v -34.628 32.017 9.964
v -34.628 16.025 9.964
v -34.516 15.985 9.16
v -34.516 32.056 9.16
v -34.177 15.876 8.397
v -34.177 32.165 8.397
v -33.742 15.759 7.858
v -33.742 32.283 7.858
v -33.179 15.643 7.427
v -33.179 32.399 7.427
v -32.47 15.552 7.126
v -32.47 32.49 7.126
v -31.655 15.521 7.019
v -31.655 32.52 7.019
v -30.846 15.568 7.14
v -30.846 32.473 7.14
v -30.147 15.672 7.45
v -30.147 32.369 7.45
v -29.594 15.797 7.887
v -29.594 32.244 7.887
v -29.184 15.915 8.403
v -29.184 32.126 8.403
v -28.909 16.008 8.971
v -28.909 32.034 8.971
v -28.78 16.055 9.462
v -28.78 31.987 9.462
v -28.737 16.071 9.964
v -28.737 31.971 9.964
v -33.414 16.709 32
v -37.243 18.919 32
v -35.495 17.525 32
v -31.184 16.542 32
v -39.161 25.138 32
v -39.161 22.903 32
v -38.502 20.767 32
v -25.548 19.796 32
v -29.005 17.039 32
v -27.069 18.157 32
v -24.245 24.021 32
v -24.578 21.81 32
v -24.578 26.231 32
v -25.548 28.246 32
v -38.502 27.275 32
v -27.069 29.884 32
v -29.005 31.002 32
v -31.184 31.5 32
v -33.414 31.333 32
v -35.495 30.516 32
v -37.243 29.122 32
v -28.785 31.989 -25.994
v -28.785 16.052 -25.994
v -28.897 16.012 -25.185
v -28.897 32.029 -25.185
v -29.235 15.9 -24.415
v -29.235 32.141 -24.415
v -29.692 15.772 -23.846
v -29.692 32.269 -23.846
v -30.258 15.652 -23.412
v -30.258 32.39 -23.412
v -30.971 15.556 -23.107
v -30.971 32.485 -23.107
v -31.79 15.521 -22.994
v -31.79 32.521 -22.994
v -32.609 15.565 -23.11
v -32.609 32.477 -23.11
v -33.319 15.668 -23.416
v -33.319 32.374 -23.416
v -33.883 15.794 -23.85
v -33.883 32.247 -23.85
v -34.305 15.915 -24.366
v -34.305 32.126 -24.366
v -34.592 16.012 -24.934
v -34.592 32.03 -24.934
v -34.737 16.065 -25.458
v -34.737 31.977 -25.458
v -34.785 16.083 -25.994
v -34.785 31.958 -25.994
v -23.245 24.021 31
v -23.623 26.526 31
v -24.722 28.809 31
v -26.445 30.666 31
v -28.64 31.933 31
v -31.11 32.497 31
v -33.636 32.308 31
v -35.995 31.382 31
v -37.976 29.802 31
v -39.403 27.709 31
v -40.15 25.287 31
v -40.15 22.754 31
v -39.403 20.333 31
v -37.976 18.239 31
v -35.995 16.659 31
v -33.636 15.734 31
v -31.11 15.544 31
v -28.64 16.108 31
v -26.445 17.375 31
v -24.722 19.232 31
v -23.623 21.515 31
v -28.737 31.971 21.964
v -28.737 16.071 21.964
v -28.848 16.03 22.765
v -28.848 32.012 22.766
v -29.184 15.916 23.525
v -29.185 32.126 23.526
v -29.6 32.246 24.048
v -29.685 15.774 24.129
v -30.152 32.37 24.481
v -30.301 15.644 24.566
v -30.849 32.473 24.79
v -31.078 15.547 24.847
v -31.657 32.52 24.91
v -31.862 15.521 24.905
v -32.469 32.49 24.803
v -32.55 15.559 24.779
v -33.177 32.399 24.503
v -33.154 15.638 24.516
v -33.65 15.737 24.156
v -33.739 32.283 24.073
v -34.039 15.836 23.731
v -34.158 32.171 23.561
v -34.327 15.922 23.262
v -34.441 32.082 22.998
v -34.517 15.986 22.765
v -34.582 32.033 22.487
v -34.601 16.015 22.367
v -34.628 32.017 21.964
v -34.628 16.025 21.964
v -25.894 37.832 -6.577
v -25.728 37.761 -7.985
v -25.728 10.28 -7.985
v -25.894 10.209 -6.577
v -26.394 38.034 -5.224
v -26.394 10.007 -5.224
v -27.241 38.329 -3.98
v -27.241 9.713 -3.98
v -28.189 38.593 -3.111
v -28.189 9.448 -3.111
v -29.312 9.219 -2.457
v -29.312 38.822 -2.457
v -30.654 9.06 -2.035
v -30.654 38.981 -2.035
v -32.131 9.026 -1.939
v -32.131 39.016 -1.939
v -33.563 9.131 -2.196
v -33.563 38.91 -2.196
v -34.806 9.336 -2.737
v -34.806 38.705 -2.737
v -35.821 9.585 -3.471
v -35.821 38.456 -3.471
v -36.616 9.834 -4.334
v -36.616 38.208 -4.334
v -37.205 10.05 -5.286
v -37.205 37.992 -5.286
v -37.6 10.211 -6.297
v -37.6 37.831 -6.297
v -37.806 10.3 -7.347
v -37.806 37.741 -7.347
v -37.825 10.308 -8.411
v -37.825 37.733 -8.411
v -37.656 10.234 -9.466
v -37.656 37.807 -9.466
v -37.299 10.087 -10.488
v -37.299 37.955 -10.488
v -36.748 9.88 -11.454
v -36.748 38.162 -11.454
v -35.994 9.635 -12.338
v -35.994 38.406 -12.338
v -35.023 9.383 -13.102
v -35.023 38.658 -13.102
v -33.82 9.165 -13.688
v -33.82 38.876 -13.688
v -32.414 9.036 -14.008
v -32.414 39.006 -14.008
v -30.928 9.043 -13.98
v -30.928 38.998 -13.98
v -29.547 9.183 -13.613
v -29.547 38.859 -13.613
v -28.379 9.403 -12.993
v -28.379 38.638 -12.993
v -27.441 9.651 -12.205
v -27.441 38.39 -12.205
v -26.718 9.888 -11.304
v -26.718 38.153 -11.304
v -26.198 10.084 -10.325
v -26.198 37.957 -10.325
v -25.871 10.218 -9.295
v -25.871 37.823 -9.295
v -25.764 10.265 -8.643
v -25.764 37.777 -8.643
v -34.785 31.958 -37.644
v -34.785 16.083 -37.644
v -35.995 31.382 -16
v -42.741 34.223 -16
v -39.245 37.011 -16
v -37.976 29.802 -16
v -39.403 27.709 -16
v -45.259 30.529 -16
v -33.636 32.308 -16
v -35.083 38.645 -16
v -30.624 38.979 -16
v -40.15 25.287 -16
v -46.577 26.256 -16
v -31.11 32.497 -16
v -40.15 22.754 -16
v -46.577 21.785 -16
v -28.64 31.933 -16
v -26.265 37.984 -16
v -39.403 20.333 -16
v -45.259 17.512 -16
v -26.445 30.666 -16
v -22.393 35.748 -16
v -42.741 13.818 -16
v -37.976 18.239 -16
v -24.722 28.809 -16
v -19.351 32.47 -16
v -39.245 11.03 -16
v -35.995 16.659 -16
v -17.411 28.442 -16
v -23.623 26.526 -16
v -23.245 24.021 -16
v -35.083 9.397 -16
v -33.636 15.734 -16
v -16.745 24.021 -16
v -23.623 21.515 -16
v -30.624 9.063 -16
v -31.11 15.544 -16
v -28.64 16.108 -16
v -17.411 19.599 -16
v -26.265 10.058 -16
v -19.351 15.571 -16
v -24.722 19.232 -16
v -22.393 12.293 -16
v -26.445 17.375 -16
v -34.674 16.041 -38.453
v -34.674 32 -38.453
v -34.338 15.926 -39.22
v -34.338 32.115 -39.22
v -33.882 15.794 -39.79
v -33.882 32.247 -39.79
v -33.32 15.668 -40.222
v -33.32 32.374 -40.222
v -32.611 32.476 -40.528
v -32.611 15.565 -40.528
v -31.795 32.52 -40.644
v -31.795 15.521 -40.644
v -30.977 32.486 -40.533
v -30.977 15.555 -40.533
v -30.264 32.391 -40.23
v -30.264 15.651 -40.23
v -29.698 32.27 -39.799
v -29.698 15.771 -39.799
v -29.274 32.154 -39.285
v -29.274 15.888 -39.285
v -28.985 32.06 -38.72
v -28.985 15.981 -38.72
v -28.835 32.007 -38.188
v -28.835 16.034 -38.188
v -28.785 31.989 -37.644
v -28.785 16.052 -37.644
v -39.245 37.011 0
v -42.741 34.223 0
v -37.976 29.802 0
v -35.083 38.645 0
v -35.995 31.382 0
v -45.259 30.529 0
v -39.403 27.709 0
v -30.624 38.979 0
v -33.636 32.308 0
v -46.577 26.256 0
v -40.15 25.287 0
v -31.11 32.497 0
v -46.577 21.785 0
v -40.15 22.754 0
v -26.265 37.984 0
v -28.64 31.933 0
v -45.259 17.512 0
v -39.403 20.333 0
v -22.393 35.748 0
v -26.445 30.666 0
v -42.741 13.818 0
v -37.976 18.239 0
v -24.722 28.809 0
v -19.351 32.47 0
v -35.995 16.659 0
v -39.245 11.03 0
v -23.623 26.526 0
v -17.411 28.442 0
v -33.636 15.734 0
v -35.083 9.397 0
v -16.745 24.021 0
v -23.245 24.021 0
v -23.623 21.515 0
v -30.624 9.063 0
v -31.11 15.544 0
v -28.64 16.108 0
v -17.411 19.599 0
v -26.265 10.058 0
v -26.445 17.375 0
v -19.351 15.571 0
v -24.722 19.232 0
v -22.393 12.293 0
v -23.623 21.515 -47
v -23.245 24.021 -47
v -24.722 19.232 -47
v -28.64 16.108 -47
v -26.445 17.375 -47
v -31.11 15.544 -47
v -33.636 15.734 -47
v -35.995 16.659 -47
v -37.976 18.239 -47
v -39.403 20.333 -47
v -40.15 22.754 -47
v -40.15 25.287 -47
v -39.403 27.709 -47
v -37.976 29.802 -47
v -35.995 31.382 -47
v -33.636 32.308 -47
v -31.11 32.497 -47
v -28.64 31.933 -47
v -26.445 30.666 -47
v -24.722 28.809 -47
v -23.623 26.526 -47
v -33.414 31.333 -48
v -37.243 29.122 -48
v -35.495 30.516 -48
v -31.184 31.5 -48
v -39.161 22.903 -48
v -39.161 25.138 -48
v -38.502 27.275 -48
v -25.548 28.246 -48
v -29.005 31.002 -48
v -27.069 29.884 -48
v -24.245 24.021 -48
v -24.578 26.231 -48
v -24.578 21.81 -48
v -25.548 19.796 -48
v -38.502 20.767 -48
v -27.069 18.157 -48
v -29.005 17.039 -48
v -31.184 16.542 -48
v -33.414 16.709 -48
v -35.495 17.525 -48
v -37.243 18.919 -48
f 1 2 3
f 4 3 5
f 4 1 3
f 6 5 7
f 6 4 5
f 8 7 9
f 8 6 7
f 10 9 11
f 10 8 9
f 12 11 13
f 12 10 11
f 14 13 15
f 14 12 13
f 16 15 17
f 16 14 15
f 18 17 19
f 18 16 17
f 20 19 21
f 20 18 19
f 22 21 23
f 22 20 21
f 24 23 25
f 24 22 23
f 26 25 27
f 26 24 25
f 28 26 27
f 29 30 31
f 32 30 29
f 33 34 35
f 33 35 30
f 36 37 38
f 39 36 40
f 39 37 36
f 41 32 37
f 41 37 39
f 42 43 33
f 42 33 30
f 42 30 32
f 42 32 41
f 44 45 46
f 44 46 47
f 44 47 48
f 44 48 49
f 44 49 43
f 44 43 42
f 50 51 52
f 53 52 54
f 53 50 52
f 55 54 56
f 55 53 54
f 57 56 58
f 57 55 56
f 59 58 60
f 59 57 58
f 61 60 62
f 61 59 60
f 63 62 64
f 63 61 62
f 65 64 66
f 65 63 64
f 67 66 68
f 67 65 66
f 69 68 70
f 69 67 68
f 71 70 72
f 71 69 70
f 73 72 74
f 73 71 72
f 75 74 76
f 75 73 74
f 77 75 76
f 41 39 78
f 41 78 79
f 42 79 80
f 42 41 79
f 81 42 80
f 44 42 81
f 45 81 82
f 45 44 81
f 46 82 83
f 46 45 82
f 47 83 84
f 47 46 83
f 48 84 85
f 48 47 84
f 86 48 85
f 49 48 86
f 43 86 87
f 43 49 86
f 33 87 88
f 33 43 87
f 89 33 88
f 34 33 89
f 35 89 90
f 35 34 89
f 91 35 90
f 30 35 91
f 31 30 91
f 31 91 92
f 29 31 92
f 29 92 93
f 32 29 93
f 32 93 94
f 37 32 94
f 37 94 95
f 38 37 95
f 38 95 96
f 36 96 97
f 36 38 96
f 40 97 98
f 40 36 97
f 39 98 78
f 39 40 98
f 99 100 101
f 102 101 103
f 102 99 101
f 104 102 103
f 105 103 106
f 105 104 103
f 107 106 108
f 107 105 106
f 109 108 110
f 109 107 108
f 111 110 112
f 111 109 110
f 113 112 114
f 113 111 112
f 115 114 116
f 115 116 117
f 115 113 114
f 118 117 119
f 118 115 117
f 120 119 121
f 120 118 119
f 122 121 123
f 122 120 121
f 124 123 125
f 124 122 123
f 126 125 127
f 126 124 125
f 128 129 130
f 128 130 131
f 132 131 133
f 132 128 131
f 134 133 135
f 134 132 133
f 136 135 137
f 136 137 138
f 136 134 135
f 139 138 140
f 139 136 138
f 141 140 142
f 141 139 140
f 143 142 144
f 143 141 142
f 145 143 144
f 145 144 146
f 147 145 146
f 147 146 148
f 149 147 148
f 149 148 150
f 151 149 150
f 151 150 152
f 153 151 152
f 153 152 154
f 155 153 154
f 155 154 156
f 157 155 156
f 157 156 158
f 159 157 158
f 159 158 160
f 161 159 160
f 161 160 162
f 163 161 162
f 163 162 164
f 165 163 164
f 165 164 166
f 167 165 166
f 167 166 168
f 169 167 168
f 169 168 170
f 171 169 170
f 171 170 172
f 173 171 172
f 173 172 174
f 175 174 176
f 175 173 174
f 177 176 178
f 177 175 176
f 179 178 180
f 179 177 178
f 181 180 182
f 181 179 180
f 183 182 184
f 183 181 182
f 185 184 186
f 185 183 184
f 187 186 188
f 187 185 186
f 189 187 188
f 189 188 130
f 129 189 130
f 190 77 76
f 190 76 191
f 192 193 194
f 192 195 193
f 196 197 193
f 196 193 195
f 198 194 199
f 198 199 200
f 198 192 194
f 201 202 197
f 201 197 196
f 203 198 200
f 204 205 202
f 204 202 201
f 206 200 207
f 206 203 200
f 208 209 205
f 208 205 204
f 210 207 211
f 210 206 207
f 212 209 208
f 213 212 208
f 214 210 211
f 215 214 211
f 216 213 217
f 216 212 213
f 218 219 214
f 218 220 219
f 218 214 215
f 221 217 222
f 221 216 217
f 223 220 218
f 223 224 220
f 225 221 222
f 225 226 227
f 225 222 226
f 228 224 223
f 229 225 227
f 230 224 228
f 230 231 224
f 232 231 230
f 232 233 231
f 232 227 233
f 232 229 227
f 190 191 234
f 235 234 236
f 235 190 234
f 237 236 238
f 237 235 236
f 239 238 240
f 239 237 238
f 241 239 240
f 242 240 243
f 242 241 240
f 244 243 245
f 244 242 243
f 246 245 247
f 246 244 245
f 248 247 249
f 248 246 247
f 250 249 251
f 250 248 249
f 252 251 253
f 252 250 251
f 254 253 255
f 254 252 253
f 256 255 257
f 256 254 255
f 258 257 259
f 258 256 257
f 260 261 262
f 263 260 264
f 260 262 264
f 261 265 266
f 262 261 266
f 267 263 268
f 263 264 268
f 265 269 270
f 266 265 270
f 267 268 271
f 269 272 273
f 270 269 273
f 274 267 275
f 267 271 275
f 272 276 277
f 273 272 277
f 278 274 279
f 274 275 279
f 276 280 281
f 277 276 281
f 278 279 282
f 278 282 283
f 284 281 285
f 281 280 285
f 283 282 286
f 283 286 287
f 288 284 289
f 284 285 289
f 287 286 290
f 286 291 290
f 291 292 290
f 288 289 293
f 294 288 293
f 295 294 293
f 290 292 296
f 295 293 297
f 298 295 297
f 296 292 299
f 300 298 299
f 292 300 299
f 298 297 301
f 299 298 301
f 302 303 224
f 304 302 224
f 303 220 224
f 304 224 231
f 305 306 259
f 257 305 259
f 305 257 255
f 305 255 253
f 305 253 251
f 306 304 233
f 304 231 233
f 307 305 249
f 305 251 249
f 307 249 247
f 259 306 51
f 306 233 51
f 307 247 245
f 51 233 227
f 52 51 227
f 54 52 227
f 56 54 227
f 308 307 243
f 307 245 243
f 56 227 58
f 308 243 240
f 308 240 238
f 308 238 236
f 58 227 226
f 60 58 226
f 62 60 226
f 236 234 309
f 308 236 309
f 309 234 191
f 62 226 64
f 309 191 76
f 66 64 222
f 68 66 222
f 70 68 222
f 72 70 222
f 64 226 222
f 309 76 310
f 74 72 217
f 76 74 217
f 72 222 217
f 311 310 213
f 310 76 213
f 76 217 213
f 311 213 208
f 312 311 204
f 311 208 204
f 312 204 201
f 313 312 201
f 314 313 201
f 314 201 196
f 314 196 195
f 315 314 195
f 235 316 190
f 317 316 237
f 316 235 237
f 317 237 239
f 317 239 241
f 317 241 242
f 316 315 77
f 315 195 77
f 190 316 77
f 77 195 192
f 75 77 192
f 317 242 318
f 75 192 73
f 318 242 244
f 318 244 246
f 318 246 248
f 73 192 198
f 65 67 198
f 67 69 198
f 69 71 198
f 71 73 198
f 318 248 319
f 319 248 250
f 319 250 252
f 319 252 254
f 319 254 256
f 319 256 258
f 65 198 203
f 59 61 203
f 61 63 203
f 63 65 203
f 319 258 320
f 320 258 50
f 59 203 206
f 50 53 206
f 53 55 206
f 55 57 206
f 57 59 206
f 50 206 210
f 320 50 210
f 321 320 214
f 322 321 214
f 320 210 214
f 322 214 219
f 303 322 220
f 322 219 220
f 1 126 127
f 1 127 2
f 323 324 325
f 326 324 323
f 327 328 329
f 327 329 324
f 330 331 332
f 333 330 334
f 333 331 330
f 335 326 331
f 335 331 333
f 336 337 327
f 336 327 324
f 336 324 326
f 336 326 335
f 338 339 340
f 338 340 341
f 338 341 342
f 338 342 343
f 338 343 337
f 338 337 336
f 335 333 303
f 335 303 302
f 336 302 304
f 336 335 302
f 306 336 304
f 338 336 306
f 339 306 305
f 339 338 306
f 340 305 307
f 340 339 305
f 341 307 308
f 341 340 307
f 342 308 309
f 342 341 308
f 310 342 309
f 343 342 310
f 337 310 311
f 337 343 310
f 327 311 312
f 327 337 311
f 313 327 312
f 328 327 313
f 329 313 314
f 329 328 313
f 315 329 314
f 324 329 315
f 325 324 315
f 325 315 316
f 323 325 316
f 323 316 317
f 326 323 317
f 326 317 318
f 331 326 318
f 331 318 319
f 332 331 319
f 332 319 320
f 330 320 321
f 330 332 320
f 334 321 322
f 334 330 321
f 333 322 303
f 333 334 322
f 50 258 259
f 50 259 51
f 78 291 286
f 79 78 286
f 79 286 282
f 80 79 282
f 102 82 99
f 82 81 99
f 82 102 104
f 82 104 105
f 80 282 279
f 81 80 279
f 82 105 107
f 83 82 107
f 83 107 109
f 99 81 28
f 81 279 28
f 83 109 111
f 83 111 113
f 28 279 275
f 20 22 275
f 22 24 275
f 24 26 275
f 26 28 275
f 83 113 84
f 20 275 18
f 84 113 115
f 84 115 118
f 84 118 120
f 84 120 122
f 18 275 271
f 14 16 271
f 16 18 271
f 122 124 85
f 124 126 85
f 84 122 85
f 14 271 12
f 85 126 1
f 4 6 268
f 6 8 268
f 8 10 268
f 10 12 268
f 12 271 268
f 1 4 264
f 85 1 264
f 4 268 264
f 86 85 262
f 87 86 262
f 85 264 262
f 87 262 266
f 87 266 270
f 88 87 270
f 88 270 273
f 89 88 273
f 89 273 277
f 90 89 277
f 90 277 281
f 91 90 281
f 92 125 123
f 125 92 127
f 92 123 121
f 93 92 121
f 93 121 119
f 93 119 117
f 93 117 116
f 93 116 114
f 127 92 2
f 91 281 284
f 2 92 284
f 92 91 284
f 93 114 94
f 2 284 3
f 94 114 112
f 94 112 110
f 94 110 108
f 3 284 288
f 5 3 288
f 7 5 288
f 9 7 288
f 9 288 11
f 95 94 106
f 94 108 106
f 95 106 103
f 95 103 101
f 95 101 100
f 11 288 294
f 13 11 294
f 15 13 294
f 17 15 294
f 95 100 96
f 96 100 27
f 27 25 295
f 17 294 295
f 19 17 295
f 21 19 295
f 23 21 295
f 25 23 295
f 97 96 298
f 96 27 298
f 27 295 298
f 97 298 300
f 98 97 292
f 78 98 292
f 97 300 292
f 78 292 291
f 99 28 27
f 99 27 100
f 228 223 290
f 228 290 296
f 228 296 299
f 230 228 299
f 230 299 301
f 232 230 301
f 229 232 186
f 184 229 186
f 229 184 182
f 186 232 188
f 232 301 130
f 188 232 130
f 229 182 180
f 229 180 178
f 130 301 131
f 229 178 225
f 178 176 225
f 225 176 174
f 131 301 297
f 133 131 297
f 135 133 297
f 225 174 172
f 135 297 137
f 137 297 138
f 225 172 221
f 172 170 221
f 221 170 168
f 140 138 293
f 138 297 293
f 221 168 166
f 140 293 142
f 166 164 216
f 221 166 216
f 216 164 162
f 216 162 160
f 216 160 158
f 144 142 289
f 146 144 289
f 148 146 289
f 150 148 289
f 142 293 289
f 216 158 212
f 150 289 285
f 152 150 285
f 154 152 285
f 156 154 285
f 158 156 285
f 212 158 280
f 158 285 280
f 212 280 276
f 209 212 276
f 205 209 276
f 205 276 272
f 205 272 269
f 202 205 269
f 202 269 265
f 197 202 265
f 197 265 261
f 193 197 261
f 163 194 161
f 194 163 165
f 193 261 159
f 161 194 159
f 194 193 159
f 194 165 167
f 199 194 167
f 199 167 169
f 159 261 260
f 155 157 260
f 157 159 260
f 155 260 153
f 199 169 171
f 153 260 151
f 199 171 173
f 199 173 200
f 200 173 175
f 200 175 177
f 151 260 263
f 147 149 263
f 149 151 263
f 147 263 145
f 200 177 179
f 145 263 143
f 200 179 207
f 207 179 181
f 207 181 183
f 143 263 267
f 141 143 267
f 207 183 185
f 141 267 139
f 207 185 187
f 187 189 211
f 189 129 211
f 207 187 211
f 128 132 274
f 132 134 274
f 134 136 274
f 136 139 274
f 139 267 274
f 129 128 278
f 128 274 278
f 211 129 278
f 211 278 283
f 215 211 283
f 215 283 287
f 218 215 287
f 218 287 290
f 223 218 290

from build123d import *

# Parameters (mm, degrees)
F0_R      = 8.5
F1_DEPTH  = 32
F4_DEPTH  = 32.4
F5_SIZE   = 1
F6_R      = 15
F7_DEPTH  = 16
F8_R      = 8.5
F9_DEPTH  = 32
F10_SIZE  = 1
F13_DEPTH = 46.1
F15_R     = 6.055959
F16_DEPTH = 53.1


with BuildPart() as f1:
    # F0 (on Top) → F1 (new body)
    with BuildSketch(Plane.XY):
        with Locations((-31.744916, 24.020635)):
            Circle(F0_R)
    extrude(amount=F1_DEPTH)

    # F3 (on offset) → F4 (cut)
    with BuildSketch(Plane.XZ.offset(-33)):
        with BuildLine():
            ThreePointArc((-28.736681, 21.964274), (-31.682465, 24.910059), (-34.62825, 21.964274))
            Line((-34.62825, 21.964274), (-34.62825, 9.964274))
            ThreePointArc((-34.62825, 9.964274), (-31.682465, 7.01849), (-28.736681, 9.964274))
            Line((-28.736681, 9.964274), (-28.736681, 21.964274))
        make_face()
    extrude(amount=F4_DEPTH, mode=Mode.SUBTRACT)

    # F5
    f5_edges = [f1.edges().sort_by_distance(p)[0] for p in [
        (-40.244916, 24.020635, 32),
    ]]
    chamfer(f5_edges, length=F5_SIZE)

    # F6 (on face) → F7 (join)
    with BuildSketch(Plane(origin=(0, 0, 0), x_dir=(1, 0, 0), z_dir=(0, 0, -1))):
        with Locations((-31.744916, -24.020635)):
            Circle(F6_R)
    extrude(amount=F7_DEPTH)

    # F8 (on face) → F9 (join)
    with BuildSketch(Plane(origin=(0, 0, -16), x_dir=(1, 0, 0), z_dir=(0, 0, -1))):
        with Locations((-31.744916, -24.020635)):
            Circle(F8_R)
    extrude(amount=F9_DEPTH)

    # F10
    f10_edges = [f1.edges().sort_by_distance(p)[0] for p in [
        (-40.244916, 24.020635, -48),
    ]]
    chamfer(f10_edges, length=F10_SIZE)

    # F12 (on offset) → F13 (cut)
    with BuildSketch(Plane.XZ.offset(-35.2)):
        with BuildLine():
            Line((-28.785402, -37.644354), (-28.785402, -25.994403))
            ThreePointArc((-28.785402, -25.994403), (-31.785402, -22.994403), (-34.785402, -25.994403))
            Line((-34.785402, -25.994403), (-34.785402, -37.644354))
            ThreePointArc((-34.785402, -37.644354), (-31.785402, -40.644354), (-28.785402, -37.644354))
        make_face()
    extrude(amount=F13_DEPTH, mode=Mode.SUBTRACT)

    # F15 (on offset) → F16 (cut)
    with BuildSketch(Plane.XZ.offset(-41.4)):
        with Locations((-31.784016, -7.985172)):
            Circle(F15_R)
    extrude(amount=F16_DEPTH, mode=Mode.SUBTRACT)


solid = f1.part
